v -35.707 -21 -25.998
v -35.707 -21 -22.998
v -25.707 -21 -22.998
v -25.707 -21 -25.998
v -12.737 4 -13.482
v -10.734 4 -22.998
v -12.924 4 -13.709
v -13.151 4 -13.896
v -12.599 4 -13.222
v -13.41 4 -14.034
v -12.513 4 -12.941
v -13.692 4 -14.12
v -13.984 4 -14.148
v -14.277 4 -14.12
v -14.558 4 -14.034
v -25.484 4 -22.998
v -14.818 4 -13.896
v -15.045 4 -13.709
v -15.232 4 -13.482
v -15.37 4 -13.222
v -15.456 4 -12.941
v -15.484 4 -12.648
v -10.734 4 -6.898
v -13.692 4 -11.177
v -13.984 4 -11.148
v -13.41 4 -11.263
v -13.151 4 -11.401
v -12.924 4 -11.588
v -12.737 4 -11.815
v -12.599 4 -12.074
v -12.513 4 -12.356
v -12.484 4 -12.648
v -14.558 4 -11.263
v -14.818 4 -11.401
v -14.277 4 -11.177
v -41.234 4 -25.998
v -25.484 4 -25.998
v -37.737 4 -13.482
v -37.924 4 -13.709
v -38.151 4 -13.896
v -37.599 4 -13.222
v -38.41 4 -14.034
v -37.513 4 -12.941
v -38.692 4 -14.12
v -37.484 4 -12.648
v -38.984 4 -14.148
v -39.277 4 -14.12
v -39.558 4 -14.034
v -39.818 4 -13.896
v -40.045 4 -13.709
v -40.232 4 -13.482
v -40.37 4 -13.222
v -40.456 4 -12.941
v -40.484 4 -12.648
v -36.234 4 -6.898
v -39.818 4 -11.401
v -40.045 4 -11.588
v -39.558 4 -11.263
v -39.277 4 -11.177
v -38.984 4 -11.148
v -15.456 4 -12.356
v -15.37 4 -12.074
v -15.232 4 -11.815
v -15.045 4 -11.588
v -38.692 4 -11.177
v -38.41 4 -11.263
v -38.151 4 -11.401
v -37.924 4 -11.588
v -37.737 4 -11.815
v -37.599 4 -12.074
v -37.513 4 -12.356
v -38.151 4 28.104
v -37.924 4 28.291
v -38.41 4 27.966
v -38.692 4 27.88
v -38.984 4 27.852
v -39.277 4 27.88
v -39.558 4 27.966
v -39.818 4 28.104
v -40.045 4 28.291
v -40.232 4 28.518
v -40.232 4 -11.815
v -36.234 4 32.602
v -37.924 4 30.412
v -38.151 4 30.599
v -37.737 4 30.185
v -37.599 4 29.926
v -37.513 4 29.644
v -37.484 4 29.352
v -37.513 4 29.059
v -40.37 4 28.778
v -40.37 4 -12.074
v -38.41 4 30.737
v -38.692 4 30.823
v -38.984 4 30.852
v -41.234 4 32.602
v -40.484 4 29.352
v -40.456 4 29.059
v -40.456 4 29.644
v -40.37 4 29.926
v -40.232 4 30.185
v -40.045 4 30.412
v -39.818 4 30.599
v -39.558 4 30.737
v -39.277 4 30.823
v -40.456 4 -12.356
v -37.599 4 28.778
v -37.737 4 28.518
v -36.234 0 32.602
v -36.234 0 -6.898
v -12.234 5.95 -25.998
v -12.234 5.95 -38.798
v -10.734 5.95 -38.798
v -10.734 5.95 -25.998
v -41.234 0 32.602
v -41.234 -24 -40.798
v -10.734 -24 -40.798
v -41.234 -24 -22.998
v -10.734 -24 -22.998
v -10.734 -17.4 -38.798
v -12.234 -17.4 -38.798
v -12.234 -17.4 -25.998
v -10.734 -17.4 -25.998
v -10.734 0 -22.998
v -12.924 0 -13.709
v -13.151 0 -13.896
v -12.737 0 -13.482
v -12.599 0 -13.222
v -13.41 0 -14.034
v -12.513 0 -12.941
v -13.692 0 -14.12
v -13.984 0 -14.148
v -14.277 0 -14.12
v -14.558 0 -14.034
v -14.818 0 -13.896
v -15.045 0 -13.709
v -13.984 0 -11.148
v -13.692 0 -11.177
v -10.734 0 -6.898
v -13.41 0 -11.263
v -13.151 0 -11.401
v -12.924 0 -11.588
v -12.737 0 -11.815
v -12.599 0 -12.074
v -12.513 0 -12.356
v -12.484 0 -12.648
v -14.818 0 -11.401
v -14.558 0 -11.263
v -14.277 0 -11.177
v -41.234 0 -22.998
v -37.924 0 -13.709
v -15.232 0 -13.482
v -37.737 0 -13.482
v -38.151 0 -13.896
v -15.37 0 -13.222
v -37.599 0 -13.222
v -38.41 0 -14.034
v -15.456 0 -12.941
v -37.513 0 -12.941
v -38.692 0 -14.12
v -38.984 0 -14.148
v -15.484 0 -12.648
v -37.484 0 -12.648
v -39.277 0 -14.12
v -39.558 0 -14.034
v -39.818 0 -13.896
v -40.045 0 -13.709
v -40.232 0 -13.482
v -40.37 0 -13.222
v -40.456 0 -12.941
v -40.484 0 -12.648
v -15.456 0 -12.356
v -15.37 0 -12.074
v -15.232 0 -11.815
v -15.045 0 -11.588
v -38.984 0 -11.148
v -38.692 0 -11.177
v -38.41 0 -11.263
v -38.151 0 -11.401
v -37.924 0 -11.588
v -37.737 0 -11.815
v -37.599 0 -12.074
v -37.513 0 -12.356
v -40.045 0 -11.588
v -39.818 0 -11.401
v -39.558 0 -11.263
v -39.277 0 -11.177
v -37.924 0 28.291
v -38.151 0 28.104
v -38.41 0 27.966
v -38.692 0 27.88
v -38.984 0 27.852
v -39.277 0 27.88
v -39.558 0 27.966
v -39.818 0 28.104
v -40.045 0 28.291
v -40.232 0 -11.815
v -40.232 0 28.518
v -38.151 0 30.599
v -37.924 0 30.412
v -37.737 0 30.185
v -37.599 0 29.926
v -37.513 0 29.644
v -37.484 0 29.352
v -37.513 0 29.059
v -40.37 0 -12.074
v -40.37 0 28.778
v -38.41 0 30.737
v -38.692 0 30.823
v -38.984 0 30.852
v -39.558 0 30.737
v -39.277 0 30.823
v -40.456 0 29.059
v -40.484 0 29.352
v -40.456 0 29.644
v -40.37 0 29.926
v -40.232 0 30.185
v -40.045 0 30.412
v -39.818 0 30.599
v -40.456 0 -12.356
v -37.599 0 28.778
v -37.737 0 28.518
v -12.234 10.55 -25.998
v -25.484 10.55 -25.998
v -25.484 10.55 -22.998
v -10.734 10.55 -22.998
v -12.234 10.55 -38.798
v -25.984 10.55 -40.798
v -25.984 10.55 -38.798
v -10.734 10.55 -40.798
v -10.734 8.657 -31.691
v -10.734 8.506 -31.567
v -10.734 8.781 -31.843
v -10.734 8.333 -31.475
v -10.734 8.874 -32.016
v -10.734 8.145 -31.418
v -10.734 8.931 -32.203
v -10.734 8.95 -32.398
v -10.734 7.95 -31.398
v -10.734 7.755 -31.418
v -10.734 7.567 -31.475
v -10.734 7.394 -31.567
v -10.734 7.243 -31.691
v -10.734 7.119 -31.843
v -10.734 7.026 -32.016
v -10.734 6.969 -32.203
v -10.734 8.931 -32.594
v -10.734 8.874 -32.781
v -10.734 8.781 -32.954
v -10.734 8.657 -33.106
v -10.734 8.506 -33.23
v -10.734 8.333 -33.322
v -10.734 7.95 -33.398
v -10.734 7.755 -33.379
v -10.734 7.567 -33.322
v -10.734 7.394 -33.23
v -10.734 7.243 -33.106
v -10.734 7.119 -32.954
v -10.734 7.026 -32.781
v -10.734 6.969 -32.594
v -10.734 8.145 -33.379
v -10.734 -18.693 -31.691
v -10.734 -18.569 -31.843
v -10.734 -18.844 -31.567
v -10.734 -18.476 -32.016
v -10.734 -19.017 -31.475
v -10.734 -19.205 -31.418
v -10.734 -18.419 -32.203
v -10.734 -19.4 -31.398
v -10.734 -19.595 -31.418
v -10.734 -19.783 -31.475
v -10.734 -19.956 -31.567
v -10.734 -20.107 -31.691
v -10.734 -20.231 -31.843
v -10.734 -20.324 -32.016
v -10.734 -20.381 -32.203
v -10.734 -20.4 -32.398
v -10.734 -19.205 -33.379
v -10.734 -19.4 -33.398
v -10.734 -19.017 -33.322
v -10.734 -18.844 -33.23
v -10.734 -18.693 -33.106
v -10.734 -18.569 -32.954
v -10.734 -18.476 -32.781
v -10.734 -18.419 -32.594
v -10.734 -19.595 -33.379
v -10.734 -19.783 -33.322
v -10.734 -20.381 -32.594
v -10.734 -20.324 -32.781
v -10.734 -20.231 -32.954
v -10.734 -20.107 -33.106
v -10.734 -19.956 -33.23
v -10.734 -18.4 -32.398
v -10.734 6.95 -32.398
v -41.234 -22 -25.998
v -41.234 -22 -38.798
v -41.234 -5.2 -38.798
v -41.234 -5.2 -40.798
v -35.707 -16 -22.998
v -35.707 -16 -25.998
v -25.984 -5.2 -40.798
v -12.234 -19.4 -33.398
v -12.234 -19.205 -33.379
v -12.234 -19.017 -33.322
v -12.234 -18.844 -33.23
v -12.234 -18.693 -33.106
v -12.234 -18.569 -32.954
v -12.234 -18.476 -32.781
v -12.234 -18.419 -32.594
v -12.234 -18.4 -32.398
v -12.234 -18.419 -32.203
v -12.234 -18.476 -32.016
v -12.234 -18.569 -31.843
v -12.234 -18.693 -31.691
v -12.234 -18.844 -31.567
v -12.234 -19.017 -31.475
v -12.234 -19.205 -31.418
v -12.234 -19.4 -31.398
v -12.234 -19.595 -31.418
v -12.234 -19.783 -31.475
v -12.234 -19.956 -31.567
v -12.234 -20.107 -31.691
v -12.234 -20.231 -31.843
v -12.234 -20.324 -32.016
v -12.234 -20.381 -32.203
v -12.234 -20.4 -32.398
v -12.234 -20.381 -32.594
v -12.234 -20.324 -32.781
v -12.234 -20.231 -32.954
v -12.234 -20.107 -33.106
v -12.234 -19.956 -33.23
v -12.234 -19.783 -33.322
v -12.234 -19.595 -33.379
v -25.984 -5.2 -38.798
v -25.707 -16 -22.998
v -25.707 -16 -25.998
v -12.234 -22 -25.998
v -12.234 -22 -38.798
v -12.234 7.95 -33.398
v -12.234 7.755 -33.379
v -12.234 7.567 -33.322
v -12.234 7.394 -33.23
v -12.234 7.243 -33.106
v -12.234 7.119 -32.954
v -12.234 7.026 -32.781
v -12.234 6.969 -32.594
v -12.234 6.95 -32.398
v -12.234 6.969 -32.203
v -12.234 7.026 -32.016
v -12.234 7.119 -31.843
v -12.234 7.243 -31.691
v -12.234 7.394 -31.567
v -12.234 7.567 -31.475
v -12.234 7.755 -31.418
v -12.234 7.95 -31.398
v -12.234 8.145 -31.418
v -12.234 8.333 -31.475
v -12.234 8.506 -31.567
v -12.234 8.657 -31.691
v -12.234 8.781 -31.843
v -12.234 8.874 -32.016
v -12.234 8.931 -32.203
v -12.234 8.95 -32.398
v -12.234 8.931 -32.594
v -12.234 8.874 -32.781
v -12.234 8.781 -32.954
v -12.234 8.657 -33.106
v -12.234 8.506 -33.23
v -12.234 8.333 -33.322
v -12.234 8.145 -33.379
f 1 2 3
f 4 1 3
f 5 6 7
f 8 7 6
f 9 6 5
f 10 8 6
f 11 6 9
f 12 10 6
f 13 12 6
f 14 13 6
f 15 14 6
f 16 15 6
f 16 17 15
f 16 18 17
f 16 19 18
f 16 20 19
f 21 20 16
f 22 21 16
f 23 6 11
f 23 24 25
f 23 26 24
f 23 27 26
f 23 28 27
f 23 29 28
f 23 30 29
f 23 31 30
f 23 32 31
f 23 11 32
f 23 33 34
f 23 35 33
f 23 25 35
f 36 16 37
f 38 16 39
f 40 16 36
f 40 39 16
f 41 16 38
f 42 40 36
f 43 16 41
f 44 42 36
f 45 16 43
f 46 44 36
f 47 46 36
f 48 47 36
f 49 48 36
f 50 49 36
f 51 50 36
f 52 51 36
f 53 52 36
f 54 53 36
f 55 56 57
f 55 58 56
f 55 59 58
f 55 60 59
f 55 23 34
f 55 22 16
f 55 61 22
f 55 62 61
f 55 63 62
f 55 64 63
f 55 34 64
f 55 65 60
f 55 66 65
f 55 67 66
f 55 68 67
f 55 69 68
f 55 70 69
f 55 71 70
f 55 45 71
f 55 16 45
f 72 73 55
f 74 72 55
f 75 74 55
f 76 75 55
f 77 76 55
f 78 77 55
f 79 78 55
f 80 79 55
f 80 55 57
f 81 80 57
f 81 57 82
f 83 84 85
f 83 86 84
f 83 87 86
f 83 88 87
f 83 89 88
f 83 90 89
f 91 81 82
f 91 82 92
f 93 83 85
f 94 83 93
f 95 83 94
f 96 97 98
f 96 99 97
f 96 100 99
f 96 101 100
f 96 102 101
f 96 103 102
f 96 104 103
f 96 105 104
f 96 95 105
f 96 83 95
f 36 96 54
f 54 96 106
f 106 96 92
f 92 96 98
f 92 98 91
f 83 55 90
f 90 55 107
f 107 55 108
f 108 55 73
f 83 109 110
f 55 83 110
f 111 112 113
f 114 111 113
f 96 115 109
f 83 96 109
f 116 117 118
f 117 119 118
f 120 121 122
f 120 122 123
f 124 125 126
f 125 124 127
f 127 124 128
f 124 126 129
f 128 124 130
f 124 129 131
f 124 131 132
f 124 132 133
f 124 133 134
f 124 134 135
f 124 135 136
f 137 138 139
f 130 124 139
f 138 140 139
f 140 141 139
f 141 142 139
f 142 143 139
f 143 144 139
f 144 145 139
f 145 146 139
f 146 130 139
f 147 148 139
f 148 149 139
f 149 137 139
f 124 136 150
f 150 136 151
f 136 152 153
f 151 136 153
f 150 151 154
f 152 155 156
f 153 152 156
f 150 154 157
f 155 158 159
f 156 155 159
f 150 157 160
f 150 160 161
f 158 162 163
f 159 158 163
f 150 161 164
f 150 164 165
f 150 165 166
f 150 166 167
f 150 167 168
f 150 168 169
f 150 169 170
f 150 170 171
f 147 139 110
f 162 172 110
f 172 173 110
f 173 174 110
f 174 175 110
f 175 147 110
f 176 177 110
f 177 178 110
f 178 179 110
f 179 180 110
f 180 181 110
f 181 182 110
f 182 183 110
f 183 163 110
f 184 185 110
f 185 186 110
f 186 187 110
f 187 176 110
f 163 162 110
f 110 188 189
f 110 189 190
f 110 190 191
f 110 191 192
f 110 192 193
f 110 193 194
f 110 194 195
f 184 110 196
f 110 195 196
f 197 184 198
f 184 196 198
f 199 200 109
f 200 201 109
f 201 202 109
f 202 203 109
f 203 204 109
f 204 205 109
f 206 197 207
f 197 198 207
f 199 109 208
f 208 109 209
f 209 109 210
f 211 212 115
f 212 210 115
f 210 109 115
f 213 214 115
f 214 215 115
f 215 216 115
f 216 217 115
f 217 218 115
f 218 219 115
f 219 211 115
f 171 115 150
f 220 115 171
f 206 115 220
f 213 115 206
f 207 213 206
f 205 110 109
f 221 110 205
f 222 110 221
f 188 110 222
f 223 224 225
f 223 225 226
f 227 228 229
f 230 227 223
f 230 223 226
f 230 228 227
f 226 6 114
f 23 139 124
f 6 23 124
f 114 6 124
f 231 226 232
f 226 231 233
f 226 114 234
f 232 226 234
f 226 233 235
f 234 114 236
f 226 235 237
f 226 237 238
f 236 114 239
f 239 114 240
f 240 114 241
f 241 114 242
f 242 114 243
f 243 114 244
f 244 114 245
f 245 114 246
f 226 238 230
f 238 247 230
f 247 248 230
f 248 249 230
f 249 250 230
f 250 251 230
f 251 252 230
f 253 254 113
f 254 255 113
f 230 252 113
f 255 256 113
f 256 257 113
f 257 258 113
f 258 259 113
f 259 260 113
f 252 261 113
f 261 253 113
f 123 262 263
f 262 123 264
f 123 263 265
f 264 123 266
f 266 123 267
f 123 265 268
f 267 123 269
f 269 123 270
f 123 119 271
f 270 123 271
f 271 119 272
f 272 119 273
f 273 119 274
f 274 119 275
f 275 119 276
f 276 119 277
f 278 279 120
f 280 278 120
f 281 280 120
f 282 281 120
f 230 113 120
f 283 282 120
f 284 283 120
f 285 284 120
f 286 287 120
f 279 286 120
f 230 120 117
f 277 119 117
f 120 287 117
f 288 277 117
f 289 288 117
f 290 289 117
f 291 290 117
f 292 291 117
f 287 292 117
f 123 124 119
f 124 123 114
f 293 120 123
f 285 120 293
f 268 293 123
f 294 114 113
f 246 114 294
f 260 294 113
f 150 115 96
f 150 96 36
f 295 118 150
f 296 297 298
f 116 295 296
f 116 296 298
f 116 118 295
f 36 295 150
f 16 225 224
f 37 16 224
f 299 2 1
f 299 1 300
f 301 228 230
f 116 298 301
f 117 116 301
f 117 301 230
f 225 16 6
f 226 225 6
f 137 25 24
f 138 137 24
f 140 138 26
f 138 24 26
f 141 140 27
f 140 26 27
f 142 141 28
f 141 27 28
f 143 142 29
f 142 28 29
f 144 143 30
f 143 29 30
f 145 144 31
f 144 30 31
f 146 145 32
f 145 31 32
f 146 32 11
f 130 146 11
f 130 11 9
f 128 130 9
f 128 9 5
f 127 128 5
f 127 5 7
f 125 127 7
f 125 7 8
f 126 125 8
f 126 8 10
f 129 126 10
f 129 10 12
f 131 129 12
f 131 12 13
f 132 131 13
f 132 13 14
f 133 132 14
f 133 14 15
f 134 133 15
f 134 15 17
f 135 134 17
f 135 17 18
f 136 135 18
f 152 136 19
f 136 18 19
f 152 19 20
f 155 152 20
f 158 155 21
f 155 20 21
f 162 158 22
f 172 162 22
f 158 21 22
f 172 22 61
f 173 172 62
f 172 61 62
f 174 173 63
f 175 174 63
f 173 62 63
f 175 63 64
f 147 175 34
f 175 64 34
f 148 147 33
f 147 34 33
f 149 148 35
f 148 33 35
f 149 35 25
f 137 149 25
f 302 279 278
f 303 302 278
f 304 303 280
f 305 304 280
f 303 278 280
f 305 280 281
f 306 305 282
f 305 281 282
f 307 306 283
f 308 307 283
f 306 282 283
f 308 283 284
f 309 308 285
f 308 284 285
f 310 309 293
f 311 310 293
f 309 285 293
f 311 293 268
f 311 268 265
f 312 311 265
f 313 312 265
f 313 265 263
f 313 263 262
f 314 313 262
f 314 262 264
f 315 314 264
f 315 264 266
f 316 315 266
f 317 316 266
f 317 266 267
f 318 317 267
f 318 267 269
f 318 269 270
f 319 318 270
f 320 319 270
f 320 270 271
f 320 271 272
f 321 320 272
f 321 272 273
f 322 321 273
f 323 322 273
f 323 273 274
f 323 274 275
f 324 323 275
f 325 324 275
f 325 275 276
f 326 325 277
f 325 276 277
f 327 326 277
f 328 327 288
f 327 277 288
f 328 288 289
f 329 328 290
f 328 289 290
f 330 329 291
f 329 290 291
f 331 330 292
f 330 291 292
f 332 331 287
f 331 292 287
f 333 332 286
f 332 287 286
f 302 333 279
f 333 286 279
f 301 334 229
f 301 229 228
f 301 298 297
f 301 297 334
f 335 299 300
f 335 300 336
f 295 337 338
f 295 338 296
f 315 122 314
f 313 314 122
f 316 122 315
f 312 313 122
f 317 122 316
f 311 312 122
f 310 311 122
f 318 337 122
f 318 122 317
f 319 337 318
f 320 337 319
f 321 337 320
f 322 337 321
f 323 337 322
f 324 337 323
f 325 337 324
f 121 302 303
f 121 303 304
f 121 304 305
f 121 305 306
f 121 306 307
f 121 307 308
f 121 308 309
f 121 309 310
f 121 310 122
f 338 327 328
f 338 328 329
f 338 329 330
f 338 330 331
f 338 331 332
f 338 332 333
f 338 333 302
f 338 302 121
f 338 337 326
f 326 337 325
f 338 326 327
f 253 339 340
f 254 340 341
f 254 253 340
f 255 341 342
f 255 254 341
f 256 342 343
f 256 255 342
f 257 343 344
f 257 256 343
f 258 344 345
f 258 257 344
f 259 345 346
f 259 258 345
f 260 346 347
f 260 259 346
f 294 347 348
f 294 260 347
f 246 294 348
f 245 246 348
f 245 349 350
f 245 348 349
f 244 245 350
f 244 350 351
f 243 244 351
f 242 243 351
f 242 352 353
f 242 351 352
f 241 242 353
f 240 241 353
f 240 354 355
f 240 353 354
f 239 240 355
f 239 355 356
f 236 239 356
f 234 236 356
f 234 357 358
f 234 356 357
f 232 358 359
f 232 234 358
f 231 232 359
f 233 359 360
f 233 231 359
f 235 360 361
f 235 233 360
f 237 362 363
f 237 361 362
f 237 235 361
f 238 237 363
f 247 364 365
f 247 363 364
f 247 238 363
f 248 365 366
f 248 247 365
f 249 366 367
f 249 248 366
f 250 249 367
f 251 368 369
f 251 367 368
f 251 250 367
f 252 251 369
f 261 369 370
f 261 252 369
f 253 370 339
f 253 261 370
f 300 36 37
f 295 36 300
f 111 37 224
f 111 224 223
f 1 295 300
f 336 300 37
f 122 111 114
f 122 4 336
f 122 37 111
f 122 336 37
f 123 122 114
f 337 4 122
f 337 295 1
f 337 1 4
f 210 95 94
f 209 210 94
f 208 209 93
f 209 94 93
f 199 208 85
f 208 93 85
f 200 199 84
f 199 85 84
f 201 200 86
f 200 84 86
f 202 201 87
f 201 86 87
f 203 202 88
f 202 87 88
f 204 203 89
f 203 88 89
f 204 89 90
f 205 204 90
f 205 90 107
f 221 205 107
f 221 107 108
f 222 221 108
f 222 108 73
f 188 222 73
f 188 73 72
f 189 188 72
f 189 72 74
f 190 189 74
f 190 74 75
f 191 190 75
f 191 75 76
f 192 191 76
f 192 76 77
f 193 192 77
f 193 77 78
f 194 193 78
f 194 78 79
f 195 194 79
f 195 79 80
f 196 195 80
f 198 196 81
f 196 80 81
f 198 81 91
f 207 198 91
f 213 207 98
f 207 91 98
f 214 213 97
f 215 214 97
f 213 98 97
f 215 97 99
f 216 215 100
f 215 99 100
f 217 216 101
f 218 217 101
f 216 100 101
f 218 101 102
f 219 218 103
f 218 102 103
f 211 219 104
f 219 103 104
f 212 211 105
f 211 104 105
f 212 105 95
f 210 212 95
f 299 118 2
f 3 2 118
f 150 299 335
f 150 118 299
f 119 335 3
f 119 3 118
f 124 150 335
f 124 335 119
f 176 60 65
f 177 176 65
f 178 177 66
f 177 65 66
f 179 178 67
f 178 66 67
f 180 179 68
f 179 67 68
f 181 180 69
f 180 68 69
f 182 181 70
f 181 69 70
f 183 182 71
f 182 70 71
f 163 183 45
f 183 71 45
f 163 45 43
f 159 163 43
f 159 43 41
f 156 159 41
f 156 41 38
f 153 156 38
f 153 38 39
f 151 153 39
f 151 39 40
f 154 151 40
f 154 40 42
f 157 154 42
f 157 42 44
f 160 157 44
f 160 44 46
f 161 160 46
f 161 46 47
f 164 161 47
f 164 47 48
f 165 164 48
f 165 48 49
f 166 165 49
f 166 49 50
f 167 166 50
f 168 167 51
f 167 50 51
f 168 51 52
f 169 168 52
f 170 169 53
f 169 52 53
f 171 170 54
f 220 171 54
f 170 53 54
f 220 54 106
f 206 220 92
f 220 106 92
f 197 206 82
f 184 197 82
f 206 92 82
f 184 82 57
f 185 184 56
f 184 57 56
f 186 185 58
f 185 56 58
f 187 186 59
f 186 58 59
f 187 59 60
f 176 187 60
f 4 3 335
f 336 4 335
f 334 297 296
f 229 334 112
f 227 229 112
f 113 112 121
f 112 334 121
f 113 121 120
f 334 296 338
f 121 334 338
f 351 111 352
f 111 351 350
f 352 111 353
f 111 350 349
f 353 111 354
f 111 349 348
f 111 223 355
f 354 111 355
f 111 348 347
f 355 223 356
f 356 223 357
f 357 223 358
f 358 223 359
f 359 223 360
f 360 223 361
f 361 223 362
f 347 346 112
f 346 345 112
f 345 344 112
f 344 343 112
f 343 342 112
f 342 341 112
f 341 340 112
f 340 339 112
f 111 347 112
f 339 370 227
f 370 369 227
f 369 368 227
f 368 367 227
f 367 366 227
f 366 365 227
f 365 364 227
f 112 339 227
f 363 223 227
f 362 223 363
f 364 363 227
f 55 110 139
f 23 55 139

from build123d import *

# Parameters (mm, degrees)
SKETCH1_W            = 25.5
SKETCH1_H            = 14
BOSS_EXTRUDE1_DEPTH  = 4
SKETCH2_R            = 1.5
CUT_EXTRUDE1_DEPTH   = 53.71750714
SKETCH3_W            = 30.5
SKETCH3_H            = 4
BOSS_EXTRUDE2_DEPTH  = 5.1
SKETCH4_W            = 30.5
SKETCH4_H            = 3
BOSS_EXTRUDE3_DEPTH  = 24
SKETCH5_W            = 30.5
SKETCH5_H            = 2
BOSS_EXTRUDE8_DEPTH  = 14.8
SKETCH10_W           = 30.5
SKETCH10_H           = 2
BOSS_EXTRUDE9_DEPTH  = 16.8
SKETCH11_W           = 1.5
SKETCH11_H           = 12.8
BOSS_EXTRUDE10_DEPTH = 4.6
SKETCH13_W           = 15.25
SKETCH13_H           = 2
BOSS_EXTRUDE11_DEPTH = 15.75
SKETCH14_W           = 10
SKETCH14_H           = 5
CUT_EXTRUDE5_DEPTH   = 3
SKETCH16_R           = 1
CUT_EXTRUDE6_DEPTH   = 10
SKETCH15_W           = 14.75
SKETCH15_H           = 3
BOSS_EXTRUDE12_DEPTH = 6.55


with BuildPart() as part:
    # Sketch1 → Boss-Extrude1 (new body)
    with BuildSketch(Plane(origin=(0, 0, 0), x_dir=(1, 0, 0), z_dir=(0, 1, 0))):
        Polygon((-36.234375, 20.8984375), (-41.234375, 20.8984375), (-41.234375, -32.6015625), (-36.234375, -32.6015625), (-36.234375, 6.8984375), align=None)
        with Locations((-23.484375, 13.8984375)):
            Rectangle(SKETCH1_W, SKETCH1_H)
    extrude(amount=BOSS_EXTRUDE1_DEPTH)

    # Sketch2 → Cut-Extrude1 (cut, through all)
    with BuildSketch(Plane(origin=(0, 4, 0), x_dir=(1, 0, 0), z_dir=(0, 1, 0))):
        with Locations(Location((-38.984375, -29.3515625, 0), (0, 0, 270))):
            Circle(SKETCH2_R)
        with Locations(Location((-38.984375, 12.6484375, 0), (0, 0, 270))):
            Circle(SKETCH2_R)
        with Locations(Location((-13.984375, 12.6484375, 0), (0, 0, 270))):
            Circle(SKETCH2_R)
    extrude(amount=-CUT_EXTRUDE1_DEPTH, mode=Mode.SUBTRACT)

    # Sketch3 → Boss-Extrude2 (add)
    with BuildSketch(Plane(origin=(0, 0, -20.8984375), x_dir=(-1, 0, 0), z_dir=(0, 0, -1))):
        with Locations((25.984375, 2)):
            Rectangle(SKETCH3_W, SKETCH3_H)
    extrude(amount=BOSS_EXTRUDE2_DEPTH)

    # Sketch4 → Boss-Extrude3 (add)
    with BuildSketch(Plane.XZ):
        with Locations((-25.984375, -24.4984375)):
            Rectangle(SKETCH4_W, SKETCH4_H)
    extrude(amount=BOSS_EXTRUDE3_DEPTH)

    # Sketch5 → Boss-Extrude8 (add)
    with BuildSketch(Plane(origin=(0, 0, -25.9984375), x_dir=(-1, 0, 0), z_dir=(0, 0, -1))):
        with Locations((25.984375, -23)):
            Rectangle(SKETCH5_W, SKETCH5_H)
    extrude(amount=BOSS_EXTRUDE8_DEPTH)

    # Sketch10 → Boss-Extrude9 (add)
    with BuildSketch(Plane(origin=(0, -22, 0), x_dir=(1, 0, 0), z_dir=(0, 1, 0))):
        with Locations((-25.984375, 39.7984375)):
            Rectangle(SKETCH10_W, SKETCH10_H)
    extrude(amount=BOSS_EXTRUDE9_DEPTH)

    # Sketch11 → Boss-Extrude10 (add)
    with BuildSketch(Plane(origin=(0, -22, 0), x_dir=(1, 0, 0), z_dir=(0, 1, 0))):
        with Locations((-11.484375, 32.3984375)):
            Rectangle(SKETCH11_W, SKETCH11_H)
    boss_extrude10 = extrude(amount=BOSS_EXTRUDE10_DEPTH)

    # Sketch13 → Boss-Extrude11 (add)
    with BuildSketch(Plane(origin=(0, -5.2, 0), x_dir=(1, 0, 0), z_dir=(0, 1, 0))):
        with Locations((-18.359375, 39.7984375)):
            Rectangle(SKETCH13_W, SKETCH13_H)
    extrude(amount=BOSS_EXTRUDE11_DEPTH)

    # Sketch14 → Cut-Extrude5 (cut)
    with BuildSketch(Plane.XY.offset(-22.9984375)):
        with Locations((-30.706752917, -18.5)):
            Rectangle(SKETCH14_W, SKETCH14_H)
    extrude(amount=-CUT_EXTRUDE5_DEPTH, mode=Mode.SUBTRACT)

    # Sketch16 → Cut-Extrude6 (cut)
    with BuildSketch(Plane(origin=(-10.734375, 0, 0), x_dir=(0, 0, -1), z_dir=(1, 0, 0))):
        with Locations((32.3984375, -19.4)):
            Circle(SKETCH16_R)
    cut_extrude6 = extrude(amount=-CUT_EXTRUDE6_DEPTH, mode=Mode.SUBTRACT)

    # Mirror1: Boss-Extrude10, Cut-Extrude6 across plane
    add(boss_extrude10.mirror(Plane(origin=(0, -5.725, 0), x_dir=(0, 0, 1), z_dir=(0, -1, 0))))
    add(cut_extrude6.mirror(Plane(origin=(0, -5.725, 0), x_dir=(0, 0, 1), z_dir=(0, -1, 0))), mode=Mode.SUBTRACT)

    # Sketch15 → Boss-Extrude12 (add)
    with BuildSketch(Plane(origin=(0, 4, 0), x_dir=(1, 0, 0), z_dir=(0, 1, 0))):
        with Locations((-18.109375, 24.4984375)):
            Rectangle(SKETCH15_W, SKETCH15_H)
    extrude(amount=BOSS_EXTRUDE12_DEPTH)


solid = part.part
